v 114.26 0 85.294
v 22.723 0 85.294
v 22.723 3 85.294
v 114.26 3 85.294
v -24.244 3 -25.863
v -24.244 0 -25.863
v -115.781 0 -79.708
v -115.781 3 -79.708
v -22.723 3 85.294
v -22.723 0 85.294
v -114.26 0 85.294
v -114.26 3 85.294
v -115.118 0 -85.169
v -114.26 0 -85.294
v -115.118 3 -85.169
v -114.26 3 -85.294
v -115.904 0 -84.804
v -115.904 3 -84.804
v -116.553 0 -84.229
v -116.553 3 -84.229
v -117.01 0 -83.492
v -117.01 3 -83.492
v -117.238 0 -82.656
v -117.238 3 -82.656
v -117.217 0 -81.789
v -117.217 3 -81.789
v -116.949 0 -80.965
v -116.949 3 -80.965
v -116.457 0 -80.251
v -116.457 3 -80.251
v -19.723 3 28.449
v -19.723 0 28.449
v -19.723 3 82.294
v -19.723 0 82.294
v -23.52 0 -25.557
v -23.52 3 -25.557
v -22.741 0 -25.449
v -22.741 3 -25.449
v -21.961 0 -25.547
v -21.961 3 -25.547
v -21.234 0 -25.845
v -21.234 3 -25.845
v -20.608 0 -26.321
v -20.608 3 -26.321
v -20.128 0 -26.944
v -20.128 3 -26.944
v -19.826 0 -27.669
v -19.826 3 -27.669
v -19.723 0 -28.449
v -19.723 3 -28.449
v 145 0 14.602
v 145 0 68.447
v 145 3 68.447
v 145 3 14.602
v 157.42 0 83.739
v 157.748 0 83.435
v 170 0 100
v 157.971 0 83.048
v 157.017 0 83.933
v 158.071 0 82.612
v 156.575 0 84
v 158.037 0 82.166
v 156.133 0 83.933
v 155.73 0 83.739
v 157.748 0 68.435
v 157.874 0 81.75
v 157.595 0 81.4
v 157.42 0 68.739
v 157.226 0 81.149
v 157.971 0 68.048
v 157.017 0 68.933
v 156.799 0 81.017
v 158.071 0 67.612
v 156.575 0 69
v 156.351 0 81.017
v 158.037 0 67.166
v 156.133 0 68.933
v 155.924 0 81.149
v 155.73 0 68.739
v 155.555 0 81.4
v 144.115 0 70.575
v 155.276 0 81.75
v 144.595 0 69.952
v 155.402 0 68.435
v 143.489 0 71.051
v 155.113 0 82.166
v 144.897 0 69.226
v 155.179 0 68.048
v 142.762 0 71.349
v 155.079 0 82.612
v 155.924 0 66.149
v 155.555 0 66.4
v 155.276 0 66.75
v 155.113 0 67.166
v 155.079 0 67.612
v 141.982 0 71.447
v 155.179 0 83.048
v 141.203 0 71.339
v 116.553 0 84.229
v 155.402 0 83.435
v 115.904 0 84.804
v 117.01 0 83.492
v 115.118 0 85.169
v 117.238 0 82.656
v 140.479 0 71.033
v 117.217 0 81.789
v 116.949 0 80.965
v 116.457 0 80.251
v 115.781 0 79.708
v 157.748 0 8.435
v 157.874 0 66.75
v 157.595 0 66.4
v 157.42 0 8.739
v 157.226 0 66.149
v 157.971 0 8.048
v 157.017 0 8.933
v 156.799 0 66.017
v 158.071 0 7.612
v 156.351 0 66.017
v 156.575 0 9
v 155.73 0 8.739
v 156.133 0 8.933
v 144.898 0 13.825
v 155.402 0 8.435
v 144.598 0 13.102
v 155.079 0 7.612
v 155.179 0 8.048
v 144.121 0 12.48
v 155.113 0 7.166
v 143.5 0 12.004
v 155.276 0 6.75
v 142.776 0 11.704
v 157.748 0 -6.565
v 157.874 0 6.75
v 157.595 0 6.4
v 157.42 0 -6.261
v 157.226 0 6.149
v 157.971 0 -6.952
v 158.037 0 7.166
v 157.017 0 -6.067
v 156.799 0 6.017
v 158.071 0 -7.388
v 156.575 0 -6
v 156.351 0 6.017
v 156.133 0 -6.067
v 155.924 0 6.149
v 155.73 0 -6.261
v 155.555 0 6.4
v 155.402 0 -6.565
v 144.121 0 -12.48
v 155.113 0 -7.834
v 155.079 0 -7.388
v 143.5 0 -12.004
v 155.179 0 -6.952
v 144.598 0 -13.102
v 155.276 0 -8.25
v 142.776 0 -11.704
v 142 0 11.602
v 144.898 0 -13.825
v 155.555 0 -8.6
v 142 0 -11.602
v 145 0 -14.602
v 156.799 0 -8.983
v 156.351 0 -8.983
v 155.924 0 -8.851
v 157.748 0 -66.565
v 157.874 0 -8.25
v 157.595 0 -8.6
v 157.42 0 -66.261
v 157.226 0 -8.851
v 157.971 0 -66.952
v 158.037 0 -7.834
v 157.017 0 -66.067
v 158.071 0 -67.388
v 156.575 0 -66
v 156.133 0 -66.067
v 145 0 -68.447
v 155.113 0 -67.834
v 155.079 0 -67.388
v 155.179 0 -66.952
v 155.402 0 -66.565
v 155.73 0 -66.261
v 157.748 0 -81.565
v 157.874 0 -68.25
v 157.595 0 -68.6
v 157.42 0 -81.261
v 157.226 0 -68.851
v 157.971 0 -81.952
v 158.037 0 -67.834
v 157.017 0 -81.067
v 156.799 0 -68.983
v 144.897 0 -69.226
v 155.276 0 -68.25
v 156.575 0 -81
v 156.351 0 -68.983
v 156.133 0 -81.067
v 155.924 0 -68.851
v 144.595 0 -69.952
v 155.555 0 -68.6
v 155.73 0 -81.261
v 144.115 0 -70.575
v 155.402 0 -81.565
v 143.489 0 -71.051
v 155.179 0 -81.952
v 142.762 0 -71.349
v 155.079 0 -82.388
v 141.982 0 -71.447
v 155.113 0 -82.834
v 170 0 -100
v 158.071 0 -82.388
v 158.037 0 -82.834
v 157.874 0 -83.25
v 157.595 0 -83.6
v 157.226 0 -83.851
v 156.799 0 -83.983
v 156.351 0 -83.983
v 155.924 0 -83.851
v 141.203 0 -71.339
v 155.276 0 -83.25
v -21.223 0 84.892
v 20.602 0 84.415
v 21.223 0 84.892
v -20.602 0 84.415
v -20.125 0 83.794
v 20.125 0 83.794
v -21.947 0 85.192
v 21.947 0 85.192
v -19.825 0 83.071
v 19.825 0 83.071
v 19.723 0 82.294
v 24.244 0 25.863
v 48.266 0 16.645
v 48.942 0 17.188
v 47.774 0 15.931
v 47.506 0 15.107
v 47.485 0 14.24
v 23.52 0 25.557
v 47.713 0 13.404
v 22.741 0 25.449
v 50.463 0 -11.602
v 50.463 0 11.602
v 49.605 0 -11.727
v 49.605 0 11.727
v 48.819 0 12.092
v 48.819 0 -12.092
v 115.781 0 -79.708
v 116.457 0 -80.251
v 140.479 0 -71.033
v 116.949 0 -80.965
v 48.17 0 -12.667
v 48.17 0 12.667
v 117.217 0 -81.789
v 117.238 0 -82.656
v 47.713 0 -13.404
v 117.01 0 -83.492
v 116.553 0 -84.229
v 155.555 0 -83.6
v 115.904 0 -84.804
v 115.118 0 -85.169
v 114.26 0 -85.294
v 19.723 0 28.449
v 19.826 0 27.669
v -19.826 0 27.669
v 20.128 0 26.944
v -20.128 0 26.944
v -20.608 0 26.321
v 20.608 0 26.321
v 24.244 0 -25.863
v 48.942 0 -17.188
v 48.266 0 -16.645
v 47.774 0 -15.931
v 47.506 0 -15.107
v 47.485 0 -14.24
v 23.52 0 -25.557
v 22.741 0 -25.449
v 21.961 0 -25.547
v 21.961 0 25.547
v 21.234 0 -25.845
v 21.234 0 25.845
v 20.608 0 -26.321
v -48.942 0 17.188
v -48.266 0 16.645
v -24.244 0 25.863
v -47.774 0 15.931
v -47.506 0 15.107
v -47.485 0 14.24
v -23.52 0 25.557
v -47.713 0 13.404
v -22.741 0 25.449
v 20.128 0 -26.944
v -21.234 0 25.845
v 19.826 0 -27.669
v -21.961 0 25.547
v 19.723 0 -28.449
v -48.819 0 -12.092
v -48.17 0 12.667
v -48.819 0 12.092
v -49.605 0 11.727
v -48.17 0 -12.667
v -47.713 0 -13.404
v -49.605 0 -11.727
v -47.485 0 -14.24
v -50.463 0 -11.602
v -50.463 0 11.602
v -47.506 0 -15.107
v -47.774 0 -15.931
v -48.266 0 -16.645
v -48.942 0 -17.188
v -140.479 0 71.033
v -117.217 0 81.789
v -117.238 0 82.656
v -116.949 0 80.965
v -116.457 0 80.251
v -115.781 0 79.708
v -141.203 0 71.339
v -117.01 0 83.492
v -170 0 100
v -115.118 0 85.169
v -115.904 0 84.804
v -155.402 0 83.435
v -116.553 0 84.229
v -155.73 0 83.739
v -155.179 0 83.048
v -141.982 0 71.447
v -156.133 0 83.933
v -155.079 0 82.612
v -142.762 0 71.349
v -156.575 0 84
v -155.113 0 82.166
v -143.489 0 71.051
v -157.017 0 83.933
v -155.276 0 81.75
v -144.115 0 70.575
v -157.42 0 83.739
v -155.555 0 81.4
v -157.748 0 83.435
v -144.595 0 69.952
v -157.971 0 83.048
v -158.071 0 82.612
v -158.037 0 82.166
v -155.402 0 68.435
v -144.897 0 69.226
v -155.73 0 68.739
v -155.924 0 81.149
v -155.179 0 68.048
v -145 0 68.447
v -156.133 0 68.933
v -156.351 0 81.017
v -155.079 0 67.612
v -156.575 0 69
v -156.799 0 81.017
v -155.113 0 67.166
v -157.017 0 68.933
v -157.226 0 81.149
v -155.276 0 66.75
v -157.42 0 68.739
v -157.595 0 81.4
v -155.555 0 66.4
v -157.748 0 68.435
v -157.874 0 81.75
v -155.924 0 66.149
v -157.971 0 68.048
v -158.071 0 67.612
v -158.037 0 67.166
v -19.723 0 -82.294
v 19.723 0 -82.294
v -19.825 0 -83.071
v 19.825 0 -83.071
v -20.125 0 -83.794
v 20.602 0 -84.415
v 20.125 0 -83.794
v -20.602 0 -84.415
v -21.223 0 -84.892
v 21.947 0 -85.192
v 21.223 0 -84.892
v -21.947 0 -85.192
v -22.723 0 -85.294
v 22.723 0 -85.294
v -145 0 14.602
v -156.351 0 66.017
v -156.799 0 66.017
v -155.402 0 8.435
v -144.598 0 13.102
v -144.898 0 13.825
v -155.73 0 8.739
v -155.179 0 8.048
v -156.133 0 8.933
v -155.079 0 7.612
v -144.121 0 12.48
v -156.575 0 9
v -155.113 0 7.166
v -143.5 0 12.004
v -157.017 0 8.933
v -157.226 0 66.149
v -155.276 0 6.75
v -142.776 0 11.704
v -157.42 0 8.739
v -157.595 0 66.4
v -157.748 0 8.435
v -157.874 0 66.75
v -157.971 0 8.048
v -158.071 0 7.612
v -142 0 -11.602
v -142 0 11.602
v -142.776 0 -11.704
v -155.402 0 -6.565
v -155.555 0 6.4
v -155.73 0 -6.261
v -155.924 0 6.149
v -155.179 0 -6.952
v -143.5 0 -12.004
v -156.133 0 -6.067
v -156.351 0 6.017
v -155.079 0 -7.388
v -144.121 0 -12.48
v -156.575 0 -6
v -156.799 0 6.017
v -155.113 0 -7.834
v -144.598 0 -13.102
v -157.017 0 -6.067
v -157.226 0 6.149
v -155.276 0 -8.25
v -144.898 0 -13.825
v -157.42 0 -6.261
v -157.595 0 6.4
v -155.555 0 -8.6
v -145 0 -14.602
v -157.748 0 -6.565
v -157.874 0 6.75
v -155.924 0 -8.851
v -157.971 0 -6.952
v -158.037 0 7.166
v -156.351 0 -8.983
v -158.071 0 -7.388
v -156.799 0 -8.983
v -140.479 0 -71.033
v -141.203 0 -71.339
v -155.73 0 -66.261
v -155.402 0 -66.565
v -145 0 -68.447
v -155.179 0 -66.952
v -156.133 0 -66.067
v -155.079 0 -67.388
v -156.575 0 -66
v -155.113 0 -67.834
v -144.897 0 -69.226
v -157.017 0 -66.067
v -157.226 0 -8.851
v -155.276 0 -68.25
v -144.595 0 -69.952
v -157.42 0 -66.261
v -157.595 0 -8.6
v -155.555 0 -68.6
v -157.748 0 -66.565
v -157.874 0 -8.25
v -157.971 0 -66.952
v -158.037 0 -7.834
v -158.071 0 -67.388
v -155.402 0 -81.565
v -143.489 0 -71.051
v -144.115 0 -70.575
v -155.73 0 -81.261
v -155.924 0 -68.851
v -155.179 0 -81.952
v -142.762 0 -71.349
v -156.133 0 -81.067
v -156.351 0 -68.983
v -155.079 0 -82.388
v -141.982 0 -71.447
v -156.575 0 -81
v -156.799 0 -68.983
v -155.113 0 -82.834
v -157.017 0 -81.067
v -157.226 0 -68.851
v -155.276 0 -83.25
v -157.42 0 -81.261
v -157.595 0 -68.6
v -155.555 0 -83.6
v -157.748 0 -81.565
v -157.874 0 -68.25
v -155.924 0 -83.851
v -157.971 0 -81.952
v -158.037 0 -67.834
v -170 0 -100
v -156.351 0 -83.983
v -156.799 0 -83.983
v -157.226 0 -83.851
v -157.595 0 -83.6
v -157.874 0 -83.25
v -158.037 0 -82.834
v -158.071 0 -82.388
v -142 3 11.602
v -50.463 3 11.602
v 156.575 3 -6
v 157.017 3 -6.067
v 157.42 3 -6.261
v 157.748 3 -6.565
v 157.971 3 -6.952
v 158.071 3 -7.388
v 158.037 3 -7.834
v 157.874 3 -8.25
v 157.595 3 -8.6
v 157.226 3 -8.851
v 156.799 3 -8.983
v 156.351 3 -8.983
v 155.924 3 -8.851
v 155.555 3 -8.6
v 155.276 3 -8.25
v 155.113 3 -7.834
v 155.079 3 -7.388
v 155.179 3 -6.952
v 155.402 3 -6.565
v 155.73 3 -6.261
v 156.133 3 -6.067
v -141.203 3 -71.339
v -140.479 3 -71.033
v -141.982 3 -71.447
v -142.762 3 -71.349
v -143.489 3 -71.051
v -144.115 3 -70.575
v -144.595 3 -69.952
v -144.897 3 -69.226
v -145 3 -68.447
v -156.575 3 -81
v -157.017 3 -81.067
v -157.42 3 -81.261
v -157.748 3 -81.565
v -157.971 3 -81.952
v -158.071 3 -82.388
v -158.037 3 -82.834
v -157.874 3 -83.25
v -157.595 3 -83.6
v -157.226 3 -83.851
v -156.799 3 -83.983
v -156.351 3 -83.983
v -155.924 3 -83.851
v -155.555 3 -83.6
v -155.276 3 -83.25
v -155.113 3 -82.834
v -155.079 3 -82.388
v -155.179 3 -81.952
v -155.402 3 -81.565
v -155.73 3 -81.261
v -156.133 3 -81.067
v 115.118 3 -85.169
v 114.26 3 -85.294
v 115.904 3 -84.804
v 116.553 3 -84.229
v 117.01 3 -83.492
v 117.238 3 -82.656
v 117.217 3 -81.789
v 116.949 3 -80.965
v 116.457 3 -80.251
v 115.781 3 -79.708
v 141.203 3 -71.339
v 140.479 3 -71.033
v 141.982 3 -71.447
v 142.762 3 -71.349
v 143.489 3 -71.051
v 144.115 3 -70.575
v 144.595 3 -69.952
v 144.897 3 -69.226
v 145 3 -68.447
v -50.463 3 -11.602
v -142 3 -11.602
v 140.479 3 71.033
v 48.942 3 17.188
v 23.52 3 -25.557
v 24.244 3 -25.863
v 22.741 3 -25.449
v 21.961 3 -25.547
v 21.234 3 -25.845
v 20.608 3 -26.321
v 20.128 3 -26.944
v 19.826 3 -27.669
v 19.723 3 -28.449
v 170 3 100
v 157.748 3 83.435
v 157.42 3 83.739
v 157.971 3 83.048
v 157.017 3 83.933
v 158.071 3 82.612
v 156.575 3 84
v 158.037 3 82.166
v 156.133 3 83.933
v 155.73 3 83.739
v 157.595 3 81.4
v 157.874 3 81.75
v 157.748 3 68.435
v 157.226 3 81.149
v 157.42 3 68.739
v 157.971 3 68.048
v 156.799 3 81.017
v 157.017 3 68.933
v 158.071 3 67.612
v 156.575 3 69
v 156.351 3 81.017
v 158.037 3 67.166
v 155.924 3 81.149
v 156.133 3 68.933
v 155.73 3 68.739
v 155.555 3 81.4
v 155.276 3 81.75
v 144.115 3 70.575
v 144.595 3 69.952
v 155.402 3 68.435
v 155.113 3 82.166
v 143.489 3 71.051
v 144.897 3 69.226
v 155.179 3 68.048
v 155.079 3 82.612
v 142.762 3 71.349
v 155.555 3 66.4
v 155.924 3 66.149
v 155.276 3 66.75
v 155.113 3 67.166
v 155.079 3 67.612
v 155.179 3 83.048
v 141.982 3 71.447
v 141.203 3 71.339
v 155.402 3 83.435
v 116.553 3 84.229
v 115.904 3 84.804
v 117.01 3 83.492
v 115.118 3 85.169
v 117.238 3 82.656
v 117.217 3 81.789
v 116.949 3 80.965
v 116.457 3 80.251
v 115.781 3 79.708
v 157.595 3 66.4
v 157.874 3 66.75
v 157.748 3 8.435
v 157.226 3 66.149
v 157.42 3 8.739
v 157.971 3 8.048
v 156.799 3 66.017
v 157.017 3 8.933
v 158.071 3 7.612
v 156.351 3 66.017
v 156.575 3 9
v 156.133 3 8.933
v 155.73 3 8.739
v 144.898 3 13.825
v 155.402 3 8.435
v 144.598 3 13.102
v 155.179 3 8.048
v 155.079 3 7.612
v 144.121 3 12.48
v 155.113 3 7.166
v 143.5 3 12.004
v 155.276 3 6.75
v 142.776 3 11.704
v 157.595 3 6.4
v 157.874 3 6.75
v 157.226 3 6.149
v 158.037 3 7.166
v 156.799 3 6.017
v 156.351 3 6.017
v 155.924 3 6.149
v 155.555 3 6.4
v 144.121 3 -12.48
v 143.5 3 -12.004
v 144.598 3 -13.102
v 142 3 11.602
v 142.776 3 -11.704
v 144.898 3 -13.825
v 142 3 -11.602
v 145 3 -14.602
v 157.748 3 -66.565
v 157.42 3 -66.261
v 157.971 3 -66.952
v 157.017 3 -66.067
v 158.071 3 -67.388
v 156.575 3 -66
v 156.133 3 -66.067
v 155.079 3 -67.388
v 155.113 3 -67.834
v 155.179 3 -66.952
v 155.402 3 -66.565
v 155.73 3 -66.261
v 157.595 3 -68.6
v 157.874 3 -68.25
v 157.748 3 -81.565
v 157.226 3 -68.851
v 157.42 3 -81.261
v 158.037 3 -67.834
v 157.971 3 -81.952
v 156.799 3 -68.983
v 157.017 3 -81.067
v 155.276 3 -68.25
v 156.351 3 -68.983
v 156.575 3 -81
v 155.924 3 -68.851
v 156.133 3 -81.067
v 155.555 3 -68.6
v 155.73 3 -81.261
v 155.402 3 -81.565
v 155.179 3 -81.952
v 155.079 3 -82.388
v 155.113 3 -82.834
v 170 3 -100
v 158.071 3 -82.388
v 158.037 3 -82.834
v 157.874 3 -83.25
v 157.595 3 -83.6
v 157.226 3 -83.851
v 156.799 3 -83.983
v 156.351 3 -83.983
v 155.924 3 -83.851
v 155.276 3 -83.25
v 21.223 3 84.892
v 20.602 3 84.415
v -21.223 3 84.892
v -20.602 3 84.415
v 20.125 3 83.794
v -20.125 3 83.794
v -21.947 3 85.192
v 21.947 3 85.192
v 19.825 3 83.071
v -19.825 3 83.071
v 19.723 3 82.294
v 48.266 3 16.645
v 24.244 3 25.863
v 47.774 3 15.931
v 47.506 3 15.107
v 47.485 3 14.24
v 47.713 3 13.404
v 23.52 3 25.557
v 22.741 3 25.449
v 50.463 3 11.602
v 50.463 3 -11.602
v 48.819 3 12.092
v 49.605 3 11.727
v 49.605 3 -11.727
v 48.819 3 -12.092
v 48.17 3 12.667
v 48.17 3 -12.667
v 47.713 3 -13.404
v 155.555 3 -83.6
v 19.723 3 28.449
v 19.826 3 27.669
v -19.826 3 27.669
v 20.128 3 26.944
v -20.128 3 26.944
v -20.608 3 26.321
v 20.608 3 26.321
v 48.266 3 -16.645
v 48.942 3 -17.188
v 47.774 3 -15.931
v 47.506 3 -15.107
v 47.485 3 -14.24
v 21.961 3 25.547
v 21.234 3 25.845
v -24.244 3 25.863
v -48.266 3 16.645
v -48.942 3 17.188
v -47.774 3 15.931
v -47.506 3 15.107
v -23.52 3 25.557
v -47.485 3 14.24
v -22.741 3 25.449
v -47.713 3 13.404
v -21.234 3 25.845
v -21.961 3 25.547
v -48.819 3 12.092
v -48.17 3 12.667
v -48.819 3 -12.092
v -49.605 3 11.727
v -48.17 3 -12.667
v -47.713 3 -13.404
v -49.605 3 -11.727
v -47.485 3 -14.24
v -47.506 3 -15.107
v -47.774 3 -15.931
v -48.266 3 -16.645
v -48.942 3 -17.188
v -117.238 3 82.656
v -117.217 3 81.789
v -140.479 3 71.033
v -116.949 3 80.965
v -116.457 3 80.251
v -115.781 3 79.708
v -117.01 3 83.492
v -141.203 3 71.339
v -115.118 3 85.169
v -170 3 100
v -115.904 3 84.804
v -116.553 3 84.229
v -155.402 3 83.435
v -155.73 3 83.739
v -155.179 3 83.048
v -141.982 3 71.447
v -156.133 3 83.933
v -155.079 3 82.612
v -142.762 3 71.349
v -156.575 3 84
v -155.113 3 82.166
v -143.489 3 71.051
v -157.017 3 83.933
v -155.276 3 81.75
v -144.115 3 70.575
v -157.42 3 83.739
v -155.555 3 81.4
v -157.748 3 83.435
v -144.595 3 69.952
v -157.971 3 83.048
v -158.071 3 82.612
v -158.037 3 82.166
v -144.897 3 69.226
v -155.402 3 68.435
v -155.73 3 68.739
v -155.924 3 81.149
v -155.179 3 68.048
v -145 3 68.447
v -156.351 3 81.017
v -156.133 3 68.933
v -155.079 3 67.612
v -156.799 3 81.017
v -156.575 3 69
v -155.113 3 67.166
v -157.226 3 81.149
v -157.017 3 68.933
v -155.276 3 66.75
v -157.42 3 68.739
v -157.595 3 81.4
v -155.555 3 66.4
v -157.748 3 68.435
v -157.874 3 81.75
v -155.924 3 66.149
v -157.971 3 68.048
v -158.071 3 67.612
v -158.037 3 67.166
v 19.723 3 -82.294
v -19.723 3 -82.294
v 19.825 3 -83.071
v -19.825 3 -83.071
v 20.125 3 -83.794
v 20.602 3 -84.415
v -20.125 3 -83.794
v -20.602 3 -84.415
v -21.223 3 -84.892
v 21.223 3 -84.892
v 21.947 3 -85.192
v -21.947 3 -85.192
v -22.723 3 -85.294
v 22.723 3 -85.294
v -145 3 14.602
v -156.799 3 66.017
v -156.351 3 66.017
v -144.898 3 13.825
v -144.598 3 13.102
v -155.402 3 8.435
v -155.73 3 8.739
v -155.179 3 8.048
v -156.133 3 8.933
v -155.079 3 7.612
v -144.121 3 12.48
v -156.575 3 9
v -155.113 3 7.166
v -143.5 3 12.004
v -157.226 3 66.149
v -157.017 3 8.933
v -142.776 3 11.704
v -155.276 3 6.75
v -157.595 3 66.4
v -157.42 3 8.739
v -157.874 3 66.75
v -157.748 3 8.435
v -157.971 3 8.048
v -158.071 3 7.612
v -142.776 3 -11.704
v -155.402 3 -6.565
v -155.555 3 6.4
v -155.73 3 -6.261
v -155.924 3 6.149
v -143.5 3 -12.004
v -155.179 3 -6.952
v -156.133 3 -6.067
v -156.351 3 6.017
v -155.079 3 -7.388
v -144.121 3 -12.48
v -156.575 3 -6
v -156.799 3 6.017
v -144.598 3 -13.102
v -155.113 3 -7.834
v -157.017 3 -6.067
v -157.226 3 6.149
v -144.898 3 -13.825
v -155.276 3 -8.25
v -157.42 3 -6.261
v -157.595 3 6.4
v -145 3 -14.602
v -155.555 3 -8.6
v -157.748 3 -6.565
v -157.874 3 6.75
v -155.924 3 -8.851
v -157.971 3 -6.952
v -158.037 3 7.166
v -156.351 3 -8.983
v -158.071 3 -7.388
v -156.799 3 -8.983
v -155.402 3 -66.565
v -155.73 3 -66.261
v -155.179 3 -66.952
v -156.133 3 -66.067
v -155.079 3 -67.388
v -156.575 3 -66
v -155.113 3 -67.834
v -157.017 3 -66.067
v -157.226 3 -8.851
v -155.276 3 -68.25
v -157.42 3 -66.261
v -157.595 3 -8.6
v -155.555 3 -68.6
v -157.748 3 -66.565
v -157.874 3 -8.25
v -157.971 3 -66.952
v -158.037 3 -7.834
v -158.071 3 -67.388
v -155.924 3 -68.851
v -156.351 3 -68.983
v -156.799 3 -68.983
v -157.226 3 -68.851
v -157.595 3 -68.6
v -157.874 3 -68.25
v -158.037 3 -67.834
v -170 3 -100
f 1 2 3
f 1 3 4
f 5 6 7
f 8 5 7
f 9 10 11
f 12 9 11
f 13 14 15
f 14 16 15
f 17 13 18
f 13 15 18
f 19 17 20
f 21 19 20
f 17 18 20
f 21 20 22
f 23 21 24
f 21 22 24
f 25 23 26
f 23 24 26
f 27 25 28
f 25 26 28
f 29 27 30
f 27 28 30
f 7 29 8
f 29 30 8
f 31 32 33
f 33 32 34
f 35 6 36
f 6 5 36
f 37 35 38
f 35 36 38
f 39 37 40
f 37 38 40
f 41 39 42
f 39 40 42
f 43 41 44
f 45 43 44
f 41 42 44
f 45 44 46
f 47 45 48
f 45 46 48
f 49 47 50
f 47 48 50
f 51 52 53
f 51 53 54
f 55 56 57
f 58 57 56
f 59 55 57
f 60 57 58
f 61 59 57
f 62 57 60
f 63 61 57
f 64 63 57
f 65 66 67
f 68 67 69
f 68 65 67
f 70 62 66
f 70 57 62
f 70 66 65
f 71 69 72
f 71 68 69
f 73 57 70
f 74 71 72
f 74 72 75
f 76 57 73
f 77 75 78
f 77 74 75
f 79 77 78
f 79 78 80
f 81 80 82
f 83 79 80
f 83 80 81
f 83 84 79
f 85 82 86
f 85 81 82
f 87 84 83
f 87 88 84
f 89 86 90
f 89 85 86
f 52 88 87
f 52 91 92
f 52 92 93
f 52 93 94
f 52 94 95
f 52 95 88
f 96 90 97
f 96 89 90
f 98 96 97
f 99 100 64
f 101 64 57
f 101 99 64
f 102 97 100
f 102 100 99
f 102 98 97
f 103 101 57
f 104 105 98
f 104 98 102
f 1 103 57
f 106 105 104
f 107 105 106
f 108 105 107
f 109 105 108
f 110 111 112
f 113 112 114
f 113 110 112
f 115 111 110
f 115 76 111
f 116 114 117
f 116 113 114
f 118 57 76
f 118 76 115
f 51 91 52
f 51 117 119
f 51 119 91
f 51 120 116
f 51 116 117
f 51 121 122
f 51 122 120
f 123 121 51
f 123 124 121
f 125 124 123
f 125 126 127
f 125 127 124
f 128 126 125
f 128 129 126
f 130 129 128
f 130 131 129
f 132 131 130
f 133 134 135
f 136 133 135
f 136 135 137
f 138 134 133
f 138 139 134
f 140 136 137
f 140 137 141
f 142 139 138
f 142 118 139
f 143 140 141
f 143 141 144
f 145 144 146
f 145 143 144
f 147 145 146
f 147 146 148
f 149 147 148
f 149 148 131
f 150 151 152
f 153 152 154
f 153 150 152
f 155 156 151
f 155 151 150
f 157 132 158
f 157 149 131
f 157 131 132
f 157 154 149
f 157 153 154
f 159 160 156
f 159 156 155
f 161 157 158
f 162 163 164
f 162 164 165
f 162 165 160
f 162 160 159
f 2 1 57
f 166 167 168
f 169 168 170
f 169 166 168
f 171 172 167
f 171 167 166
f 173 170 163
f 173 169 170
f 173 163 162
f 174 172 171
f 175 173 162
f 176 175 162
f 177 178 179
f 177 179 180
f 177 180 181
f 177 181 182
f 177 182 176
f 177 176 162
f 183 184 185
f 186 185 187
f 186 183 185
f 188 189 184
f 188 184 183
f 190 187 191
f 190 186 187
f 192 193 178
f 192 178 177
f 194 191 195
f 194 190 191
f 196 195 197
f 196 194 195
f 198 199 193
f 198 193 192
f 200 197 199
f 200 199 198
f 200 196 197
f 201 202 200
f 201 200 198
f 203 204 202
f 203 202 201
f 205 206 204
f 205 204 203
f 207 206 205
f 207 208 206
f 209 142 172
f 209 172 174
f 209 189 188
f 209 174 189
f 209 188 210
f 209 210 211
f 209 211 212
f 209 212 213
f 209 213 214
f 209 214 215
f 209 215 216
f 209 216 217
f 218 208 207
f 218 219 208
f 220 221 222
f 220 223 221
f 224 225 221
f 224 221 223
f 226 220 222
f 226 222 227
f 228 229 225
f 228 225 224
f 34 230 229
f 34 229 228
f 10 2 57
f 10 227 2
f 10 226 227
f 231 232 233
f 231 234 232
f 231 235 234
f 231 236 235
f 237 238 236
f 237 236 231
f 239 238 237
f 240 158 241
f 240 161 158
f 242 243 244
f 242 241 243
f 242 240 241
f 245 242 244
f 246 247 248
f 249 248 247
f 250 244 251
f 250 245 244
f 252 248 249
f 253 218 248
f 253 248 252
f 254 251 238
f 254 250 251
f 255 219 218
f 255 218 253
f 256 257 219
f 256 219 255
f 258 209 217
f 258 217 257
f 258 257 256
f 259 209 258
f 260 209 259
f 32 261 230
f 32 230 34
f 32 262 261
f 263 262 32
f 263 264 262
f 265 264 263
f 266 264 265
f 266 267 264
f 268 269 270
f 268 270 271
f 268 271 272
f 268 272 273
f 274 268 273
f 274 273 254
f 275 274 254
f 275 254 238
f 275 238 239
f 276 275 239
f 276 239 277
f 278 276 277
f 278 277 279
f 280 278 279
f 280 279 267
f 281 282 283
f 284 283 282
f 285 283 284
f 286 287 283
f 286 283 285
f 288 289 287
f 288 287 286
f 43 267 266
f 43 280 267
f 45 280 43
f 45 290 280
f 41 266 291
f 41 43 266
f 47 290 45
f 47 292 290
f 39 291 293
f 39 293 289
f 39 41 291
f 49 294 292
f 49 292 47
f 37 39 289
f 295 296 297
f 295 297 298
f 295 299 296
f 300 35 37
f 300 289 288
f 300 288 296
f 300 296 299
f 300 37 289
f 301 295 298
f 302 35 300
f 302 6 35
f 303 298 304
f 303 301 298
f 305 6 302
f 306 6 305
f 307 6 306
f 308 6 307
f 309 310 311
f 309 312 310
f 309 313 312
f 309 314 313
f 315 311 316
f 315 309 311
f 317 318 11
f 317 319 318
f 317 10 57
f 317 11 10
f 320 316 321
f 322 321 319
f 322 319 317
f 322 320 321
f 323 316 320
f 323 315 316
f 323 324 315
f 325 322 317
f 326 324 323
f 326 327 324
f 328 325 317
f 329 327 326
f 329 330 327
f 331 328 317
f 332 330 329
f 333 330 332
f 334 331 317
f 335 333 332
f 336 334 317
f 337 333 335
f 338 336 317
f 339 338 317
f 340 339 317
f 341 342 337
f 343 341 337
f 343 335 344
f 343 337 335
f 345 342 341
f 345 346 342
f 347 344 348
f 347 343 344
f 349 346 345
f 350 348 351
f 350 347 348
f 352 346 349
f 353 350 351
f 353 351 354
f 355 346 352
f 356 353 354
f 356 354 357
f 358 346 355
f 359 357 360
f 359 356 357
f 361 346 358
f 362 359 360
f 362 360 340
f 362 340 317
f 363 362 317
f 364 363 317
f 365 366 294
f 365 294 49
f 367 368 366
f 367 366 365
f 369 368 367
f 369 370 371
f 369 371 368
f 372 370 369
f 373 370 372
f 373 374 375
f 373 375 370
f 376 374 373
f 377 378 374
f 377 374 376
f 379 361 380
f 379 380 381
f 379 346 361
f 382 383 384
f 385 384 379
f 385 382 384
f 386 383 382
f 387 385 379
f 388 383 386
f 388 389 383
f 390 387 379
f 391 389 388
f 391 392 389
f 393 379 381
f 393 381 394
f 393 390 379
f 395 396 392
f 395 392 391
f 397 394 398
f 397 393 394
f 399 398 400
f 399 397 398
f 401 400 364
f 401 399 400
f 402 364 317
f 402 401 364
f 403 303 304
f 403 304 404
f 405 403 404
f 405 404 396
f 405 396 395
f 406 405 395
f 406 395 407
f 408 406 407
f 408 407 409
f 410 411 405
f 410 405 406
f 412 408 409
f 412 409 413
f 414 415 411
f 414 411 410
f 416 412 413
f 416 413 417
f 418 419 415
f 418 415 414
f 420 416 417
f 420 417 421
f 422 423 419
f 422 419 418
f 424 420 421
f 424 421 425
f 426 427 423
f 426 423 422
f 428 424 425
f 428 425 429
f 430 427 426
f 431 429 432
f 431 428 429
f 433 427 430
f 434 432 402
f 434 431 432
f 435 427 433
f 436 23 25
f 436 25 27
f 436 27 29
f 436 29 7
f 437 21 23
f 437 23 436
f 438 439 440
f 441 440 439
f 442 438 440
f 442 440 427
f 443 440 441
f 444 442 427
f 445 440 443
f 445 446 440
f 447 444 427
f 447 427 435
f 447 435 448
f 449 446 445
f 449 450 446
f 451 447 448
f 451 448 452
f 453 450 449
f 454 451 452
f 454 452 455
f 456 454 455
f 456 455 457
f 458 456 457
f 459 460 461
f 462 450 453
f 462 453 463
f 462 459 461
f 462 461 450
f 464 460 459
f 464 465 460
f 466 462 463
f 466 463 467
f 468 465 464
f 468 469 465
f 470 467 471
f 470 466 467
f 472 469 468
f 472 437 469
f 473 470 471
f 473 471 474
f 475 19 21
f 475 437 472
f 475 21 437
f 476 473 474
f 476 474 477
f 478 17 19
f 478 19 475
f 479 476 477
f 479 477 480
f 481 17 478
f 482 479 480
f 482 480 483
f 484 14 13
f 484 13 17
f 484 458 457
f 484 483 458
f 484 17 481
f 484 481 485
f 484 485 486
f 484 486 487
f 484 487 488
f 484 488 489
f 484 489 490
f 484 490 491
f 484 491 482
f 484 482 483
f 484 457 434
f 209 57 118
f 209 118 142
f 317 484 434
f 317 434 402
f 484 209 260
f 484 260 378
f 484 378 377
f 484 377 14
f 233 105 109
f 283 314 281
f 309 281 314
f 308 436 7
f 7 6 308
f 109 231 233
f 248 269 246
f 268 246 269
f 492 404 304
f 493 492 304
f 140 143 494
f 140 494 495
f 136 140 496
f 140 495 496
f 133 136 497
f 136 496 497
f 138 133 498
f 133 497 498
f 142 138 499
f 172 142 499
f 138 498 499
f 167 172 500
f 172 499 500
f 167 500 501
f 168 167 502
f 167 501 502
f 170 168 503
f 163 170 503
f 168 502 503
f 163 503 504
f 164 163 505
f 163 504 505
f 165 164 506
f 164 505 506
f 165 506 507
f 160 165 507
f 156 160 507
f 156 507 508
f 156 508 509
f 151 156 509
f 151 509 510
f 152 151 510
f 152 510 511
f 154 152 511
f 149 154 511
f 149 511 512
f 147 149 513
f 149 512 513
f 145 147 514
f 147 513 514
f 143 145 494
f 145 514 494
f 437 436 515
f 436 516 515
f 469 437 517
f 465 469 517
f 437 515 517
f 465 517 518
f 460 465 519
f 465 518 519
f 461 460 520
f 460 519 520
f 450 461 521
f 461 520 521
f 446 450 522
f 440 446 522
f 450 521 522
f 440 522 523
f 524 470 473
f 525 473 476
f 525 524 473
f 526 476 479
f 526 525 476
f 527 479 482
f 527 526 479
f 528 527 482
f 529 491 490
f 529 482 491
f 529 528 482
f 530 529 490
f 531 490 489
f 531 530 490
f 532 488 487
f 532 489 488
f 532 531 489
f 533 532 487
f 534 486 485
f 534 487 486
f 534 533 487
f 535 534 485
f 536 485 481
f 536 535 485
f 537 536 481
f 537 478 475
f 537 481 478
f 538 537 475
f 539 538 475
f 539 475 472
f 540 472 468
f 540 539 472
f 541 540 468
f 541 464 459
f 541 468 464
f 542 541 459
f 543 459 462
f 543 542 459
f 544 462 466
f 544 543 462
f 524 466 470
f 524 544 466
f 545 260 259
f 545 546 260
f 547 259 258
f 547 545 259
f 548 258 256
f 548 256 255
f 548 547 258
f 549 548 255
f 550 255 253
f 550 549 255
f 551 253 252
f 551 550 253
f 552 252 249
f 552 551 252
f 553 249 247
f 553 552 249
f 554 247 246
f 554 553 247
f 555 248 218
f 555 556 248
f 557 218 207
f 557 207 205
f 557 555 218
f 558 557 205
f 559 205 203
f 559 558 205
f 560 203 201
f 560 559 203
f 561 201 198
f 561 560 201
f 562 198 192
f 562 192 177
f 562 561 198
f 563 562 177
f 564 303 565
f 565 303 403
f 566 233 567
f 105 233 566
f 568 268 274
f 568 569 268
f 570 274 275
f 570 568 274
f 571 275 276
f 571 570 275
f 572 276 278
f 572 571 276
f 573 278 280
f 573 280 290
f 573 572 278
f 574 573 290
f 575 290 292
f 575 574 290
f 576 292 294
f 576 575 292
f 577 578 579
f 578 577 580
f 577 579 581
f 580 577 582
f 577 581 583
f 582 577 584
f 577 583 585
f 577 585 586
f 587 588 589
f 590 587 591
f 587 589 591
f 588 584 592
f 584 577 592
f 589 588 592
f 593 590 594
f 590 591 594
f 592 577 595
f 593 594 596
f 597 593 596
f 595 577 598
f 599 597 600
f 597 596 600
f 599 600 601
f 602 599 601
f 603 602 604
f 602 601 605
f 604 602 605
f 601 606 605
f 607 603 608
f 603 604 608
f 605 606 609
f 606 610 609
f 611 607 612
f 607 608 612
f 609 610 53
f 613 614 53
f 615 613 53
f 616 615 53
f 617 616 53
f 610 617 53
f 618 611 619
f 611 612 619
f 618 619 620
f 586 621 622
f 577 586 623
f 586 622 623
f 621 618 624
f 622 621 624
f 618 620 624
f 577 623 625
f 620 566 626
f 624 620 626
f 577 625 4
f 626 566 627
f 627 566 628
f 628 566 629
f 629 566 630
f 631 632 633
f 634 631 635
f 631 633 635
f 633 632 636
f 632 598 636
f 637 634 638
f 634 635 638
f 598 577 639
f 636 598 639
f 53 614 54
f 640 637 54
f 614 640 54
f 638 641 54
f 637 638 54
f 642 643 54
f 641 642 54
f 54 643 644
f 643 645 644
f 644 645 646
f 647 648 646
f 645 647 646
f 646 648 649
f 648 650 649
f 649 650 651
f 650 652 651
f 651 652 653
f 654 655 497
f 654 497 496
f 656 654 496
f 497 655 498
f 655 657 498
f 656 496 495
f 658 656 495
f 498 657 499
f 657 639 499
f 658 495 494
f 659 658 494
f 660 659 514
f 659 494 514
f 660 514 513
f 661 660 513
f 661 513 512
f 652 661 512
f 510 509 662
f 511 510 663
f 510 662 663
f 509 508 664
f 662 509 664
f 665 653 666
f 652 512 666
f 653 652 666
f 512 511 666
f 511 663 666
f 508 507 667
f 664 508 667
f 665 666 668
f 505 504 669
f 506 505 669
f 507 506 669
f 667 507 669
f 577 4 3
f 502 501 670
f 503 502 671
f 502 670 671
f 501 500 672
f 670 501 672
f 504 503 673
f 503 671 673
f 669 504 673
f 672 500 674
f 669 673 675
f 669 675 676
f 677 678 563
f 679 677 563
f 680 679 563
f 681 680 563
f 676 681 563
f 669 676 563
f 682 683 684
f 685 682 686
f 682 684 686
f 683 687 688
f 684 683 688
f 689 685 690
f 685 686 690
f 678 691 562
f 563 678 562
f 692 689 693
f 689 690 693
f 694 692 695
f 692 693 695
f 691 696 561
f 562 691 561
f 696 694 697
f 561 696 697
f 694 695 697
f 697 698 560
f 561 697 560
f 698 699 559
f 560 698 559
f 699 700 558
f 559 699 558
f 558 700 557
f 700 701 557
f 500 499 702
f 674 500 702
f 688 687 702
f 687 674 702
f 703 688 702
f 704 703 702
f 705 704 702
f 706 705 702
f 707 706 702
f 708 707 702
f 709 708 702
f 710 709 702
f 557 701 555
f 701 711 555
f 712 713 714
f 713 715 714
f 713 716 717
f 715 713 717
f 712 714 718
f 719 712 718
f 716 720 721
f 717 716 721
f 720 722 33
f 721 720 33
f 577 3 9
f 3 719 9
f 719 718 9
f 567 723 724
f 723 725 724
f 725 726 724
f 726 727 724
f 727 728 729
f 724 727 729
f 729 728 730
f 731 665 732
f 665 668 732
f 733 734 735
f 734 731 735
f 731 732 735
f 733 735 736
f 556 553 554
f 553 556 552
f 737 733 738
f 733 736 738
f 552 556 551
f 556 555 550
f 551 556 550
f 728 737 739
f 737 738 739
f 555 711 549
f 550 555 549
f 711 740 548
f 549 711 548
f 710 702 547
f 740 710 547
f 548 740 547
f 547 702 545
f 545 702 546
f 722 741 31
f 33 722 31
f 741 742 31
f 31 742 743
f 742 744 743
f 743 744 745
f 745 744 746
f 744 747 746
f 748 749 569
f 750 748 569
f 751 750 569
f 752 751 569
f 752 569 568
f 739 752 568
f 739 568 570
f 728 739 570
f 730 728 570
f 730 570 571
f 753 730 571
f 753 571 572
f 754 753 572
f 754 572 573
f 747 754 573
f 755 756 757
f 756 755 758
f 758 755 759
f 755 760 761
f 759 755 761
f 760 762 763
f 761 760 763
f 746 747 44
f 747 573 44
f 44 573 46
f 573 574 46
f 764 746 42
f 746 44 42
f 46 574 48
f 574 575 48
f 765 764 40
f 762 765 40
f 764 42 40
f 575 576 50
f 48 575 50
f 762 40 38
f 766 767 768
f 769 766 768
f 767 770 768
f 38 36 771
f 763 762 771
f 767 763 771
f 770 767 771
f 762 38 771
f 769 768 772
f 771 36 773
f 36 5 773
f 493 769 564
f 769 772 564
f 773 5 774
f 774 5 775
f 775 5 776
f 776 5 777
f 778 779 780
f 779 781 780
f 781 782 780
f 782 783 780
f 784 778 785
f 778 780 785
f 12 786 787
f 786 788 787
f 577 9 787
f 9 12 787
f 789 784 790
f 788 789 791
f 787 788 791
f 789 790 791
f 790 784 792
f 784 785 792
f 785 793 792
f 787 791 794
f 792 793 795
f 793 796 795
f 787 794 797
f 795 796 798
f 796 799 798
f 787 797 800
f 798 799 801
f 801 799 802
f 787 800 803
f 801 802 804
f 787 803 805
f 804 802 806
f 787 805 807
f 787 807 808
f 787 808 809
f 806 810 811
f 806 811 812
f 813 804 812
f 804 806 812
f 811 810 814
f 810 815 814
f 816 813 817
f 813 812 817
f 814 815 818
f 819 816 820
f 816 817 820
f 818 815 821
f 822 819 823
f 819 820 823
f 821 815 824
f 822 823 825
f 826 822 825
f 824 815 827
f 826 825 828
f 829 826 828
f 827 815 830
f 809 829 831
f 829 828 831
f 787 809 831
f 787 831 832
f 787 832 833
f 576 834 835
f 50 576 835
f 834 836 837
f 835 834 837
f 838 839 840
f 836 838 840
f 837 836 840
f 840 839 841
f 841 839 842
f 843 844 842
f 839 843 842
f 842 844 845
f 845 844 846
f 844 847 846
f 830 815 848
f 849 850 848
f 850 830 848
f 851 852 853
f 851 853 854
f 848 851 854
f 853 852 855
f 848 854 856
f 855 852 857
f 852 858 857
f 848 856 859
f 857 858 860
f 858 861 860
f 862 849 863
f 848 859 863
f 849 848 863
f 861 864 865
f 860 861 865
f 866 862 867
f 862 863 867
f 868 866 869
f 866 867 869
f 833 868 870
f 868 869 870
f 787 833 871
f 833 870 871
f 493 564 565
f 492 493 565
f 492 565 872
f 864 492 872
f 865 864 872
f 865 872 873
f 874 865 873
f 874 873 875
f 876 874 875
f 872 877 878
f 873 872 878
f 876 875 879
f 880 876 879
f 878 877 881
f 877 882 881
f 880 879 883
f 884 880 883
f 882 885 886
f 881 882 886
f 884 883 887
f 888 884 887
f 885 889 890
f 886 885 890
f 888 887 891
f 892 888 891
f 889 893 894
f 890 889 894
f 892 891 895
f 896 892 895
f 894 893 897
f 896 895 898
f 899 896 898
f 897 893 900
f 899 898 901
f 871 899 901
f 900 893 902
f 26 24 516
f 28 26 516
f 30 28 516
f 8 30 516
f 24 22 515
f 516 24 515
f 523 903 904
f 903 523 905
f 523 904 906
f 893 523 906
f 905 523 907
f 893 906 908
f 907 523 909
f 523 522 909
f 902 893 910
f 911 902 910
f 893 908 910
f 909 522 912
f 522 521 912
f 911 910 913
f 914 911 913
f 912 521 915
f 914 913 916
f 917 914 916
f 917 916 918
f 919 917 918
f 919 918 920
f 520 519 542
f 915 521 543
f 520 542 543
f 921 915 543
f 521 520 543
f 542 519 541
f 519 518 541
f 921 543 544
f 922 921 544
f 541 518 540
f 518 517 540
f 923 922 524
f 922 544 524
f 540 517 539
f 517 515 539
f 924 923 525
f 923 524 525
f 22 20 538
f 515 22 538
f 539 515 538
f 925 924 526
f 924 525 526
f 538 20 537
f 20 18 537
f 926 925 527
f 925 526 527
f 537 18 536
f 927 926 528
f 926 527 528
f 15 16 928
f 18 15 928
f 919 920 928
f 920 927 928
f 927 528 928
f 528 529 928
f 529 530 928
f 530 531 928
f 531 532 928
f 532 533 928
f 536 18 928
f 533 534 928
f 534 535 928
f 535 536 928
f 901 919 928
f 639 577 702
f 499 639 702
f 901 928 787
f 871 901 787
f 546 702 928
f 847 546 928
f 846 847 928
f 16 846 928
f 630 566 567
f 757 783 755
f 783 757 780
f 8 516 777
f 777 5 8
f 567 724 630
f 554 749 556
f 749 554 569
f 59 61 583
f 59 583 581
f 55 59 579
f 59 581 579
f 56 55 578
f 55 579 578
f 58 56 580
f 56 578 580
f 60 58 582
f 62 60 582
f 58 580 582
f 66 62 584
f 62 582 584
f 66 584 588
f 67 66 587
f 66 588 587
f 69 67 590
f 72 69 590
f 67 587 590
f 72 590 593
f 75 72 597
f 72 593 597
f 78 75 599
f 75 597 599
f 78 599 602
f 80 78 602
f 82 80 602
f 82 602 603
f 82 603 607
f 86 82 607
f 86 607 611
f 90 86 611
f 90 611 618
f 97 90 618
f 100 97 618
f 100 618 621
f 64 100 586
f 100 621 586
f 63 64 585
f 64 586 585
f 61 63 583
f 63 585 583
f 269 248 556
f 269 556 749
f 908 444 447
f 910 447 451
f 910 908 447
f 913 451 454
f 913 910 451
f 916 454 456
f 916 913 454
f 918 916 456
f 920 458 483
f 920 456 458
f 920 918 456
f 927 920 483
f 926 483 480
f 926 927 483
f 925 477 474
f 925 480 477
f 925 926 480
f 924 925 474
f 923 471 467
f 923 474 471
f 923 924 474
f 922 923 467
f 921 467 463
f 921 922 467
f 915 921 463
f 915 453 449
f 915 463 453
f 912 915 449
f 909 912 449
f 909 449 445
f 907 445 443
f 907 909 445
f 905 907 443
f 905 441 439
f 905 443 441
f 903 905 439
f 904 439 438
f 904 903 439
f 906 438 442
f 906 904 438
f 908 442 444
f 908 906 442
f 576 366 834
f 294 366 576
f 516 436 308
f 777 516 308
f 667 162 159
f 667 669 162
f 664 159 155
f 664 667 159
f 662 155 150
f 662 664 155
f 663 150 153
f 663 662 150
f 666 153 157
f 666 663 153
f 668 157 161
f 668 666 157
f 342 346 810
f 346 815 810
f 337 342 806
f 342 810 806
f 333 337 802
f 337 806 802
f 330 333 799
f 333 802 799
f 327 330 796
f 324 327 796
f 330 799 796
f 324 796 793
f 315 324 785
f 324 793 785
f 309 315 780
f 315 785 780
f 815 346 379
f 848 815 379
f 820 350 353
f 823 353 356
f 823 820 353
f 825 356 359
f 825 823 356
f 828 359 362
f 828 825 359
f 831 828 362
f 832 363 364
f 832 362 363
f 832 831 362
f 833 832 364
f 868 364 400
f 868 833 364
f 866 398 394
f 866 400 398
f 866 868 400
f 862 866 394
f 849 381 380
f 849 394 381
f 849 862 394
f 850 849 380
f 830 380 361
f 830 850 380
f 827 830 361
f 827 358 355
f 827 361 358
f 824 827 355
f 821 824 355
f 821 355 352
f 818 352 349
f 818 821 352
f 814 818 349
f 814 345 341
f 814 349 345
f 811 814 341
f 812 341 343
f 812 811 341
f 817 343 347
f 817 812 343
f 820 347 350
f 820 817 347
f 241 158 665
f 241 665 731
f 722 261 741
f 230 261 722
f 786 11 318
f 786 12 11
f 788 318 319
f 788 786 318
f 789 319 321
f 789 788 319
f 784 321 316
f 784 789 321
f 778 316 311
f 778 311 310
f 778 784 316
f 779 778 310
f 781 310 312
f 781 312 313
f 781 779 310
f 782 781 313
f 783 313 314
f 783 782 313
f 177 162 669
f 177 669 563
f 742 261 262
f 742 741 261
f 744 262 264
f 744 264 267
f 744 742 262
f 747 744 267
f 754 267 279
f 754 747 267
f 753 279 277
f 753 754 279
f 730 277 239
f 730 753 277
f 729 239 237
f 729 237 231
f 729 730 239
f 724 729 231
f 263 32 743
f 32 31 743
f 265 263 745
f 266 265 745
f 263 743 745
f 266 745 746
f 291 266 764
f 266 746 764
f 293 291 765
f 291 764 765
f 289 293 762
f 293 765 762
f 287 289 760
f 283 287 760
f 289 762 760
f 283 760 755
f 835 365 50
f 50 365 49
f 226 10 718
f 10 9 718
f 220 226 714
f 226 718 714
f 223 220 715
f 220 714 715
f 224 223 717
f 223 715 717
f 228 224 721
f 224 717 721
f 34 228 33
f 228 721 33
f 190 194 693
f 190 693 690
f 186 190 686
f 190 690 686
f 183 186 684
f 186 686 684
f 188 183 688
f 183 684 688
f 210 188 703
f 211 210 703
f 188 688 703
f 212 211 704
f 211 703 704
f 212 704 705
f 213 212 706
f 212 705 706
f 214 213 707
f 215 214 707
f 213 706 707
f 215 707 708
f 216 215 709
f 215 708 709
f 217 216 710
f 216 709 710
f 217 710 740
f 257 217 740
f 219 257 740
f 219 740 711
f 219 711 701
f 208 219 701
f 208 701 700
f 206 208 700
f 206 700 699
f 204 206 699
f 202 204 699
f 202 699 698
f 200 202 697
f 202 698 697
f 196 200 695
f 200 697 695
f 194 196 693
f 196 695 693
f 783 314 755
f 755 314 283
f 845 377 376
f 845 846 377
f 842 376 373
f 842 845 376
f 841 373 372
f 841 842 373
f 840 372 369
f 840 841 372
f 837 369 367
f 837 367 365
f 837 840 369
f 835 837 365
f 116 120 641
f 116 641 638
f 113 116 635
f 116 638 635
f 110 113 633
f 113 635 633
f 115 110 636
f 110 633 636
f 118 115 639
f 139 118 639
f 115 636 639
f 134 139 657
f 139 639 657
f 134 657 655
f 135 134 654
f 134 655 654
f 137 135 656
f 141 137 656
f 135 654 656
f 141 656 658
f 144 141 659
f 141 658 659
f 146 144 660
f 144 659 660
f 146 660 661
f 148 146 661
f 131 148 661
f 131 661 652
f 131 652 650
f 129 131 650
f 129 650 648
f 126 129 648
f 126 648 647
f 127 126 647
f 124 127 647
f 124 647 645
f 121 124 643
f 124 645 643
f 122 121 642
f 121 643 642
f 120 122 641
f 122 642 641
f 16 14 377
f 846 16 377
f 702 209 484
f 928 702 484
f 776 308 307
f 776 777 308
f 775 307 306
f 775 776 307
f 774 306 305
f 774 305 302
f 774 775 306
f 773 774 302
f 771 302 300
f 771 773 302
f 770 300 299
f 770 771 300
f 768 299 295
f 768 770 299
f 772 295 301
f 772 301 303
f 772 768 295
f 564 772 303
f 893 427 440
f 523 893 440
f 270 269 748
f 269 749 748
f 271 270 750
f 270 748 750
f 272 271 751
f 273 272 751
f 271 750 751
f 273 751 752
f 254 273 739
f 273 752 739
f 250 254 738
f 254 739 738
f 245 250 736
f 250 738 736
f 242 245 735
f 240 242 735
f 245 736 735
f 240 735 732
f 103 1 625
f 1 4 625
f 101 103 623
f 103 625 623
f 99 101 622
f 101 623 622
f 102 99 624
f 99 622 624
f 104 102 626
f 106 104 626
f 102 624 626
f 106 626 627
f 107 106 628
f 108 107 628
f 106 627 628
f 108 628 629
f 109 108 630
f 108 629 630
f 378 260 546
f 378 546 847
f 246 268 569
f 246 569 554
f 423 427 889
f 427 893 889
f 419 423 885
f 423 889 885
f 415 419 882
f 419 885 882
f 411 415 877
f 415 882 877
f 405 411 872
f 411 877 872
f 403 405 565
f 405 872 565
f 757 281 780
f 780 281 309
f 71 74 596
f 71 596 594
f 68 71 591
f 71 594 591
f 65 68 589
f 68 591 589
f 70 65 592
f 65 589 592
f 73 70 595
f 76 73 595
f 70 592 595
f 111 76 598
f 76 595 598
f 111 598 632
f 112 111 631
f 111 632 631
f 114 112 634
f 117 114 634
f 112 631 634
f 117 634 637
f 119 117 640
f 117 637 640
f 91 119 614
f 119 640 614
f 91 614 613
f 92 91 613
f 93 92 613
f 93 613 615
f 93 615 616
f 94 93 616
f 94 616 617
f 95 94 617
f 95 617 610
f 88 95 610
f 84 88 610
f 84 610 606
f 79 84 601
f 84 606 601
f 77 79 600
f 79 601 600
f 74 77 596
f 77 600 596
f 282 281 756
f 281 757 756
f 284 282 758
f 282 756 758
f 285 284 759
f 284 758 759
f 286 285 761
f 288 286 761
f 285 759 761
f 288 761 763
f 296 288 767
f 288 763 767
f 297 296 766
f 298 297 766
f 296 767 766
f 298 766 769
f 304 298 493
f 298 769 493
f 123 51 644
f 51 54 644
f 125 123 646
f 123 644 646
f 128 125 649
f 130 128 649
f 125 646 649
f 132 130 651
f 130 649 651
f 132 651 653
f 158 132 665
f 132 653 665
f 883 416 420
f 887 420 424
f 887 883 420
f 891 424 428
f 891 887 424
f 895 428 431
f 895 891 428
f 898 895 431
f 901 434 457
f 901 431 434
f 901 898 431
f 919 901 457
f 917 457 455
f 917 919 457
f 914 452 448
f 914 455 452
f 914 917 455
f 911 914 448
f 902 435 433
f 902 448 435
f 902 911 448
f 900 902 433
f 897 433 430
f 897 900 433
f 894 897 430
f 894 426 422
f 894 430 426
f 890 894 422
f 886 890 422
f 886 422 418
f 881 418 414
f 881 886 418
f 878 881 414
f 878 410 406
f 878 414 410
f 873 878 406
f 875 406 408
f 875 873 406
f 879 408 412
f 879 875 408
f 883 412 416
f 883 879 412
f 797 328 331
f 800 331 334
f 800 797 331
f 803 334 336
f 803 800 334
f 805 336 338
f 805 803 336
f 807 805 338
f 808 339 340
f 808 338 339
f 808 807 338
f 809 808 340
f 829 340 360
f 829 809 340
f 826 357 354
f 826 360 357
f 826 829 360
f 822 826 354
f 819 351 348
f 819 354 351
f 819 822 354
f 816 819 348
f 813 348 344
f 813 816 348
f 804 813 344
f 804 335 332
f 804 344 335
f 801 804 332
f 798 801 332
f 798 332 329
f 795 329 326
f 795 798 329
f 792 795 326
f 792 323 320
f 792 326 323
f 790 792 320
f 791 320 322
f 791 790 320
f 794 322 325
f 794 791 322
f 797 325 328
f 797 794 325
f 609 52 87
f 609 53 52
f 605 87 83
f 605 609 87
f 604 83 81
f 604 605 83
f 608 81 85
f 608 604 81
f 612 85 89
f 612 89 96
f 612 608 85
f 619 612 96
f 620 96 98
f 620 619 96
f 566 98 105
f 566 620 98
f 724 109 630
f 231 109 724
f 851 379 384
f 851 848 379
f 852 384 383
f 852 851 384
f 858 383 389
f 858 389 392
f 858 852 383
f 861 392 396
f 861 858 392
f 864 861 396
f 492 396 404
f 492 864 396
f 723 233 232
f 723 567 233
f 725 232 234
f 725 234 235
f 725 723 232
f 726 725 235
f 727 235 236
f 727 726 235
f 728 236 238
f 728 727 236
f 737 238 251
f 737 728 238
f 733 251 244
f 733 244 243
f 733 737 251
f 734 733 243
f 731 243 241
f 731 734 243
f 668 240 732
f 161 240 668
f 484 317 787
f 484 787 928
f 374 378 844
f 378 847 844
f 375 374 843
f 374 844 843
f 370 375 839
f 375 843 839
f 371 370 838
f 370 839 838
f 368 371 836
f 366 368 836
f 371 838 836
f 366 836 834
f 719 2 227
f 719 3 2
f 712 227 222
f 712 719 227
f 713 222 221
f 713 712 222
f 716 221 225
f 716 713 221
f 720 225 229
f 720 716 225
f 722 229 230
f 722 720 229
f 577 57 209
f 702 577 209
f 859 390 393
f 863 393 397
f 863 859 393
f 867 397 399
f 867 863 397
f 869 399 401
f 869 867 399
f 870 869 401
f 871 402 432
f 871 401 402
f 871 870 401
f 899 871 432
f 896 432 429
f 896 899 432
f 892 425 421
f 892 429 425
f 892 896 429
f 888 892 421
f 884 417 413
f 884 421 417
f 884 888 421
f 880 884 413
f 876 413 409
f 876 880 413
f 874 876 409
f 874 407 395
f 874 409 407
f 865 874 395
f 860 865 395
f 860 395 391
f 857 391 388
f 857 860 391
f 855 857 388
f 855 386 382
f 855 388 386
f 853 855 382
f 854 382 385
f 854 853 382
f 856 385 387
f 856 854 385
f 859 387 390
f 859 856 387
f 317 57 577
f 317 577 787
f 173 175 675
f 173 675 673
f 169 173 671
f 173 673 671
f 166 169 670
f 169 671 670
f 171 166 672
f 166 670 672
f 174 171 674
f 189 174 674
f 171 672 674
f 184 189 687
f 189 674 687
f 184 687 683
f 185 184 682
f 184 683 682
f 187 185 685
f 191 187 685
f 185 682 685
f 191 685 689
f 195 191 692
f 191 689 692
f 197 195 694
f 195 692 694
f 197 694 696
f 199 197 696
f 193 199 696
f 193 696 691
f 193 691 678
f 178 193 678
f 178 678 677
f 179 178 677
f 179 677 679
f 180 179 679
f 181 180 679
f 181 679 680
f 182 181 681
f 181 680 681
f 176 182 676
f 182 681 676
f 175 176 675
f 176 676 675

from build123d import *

# Parameters (mm, degrees)
SKETCH1_W                      = 170
SKETCH1_H                      = 200
BOSS_EXTRUDE1_DEPTH            = 3
FILLET1_R                      = 3
F_3_0MM_DOWEL_HOLE1_AT_2_COUNT = 2
F_3_0MM_DOWEL_HOLE1_AT_2_PITCH = 15
F_3_0MM_DOWEL_HOLE1_AT_3_COUNT = 2
F_3_0MM_DOWEL_HOLE1_AT_3_PITCH = 75
F_3_0MM_DOWEL_HOLE1_AT_4_COUNT = 2
F_3_0MM_DOWEL_HOLE1_AT_4_PITCH = 90
F_3_0MM_DOWEL_HOLE1_AT_5_COUNT = 2
F_3_0MM_DOWEL_HOLE1_AT_5_PITCH = 60
F_3_0MM_DOWEL_HOLE1_AT_6_COUNT = 2
F_3_0MM_DOWEL_HOLE1_AT_6_PITCH = 75
FILLET1_OF_MIRROR1_R           = 3


with BuildPart() as part:
    # Sketch1 → Boss-Extrude1 (new body)
    with BuildSketch(Plane(origin=(0, 0, 0), x_dir=(1, 0, 0), z_dir=(0, 1, 0))):
        with Locations((-85, 0)):
            Rectangle(SKETCH1_W, SKETCH1_H)
        Polygon((-19.723082923, 85.294117647), (-19.723082923, 23.203626969), (-125.276917077, 85.294117647), align=None, mode=Mode.SUBTRACT)
        Polygon((-39.446165847, 11.601813484), (-145, 11.601813484), (-145, 73.692304163), align=None, mode=Mode.SUBTRACT)
        Polygon((-125.276917077, -85.294117647), (-19.723082923, -23.203626969), (-19.723082923, -85.294117647), align=None, mode=Mode.SUBTRACT)
        Polygon((-145, -11.601813484), (-39.446165847, -11.601813484), (-145, -73.692304163), align=None, mode=Mode.SUBTRACT)
    boss_extrude1 = extrude(amount=BOSS_EXTRUDE1_DEPTH)

    # Fillet1
    fillet1_edges = [part.edges().sort_by_distance(p)[0] for p in [
        (-19.723082923, 1.5, -23.203626969),
        (-19.723082923, 1.5, -85.294117647),
        (-125.276917077, 1.5, -85.294117647),
        (-39.446165847, 1.5, -11.601813484),
        (-145, 1.5, -73.692304163),
        (-145, 1.5, -11.601813484),
        (-39.446165847, 1.5, 11.601813484),
        (-145, 1.5, 11.601813484),
        (-145, 1.5, 73.692304163),
        (-19.723082923, 1.5, 23.203626969),
        (-125.276917077, 1.5, 85.294117647),
        (-19.723082923, 1.5, 85.294117647),
    ]]
    fillet(fillet1_edges, radius=FILLET1_R)

    # Sketch2 → Ø3.0mm Dowel Hole1 (revolve, cut)
    with BuildSketch(Plane(origin=(-156.575, 3, -7.5), x_dir=(0, 0, 1), z_dir=(1, 0, 0))):
        Polygon((0, 0), (0, 15.901290929), (1.5, 15), (1.5, 0), align=None)
    f_3_0mm_dowel_hole1 = revolve(axis=Axis((-156.575, 9.35, -7.5), (0, -1, 0)), mode=Mode.SUBTRACT)

    # Ø3.0mm Dowel Hole1 at 2: Ø3.0mm Dowel Hole1 ×2
    with Locations(*[(0, 0, i * F_3_0MM_DOWEL_HOLE1_AT_2_PITCH) for i in range(1, F_3_0MM_DOWEL_HOLE1_AT_2_COUNT)]):
        add(f_3_0mm_dowel_hole1, mode=Mode.SUBTRACT)

    # Ø3.0mm Dowel Hole1 at 3: Ø3.0mm Dowel Hole1 ×2
    with Locations(*[(0, 0, i * F_3_0MM_DOWEL_HOLE1_AT_3_PITCH) for i in range(1, F_3_0MM_DOWEL_HOLE1_AT_3_COUNT)]):
        add(f_3_0mm_dowel_hole1, mode=Mode.SUBTRACT)

    # Ø3.0mm Dowel Hole1 at 4: Ø3.0mm Dowel Hole1 ×2
    with Locations(*[(0, 0, i * F_3_0MM_DOWEL_HOLE1_AT_4_PITCH) for i in range(1, F_3_0MM_DOWEL_HOLE1_AT_4_COUNT)]):
        add(f_3_0mm_dowel_hole1, mode=Mode.SUBTRACT)

    # Ø3.0mm Dowel Hole1 at 5: Ø3.0mm Dowel Hole1 ×2
    with Locations(*[(0, 0, -i * F_3_0MM_DOWEL_HOLE1_AT_5_PITCH) for i in range(1, F_3_0MM_DOWEL_HOLE1_AT_5_COUNT)]):
        add(f_3_0mm_dowel_hole1, mode=Mode.SUBTRACT)

    # Ø3.0mm Dowel Hole1 at 6: Ø3.0mm Dowel Hole1 ×2
    with Locations(*[(0, 0, -i * F_3_0MM_DOWEL_HOLE1_AT_6_PITCH) for i in range(1, F_3_0MM_DOWEL_HOLE1_AT_6_COUNT)]):
        add(f_3_0mm_dowel_hole1, mode=Mode.SUBTRACT)

    # Mirror1: Boss-Extrude1, Ø3.0mm Dowel Hole1 across plane
    add(boss_extrude1.mirror(Plane(origin=(0, 0, 0), x_dir=(0, 0, 1), z_dir=(1, 0, 0))))
    add(f_3_0mm_dowel_hole1.mirror(Plane(origin=(0, 0, 0), x_dir=(0, 0, 1), z_dir=(1, 0, 0))), mode=Mode.SUBTRACT)

    # Mirror1 copy 1 sketch → Mirror1 copy 1 (revolve, cut)
    with BuildSketch(Plane(origin=(156.575, 3, 7.5), x_dir=(0, 0, 1), z_dir=(-1, 0, 0))):
        Polygon((0, 0), (0, -15.901290929), (1.5, -15), (1.5, 0), align=None)
    revolve(axis=Axis((156.575, 9.35, 7.5), (0, 1, 0)), mode=Mode.SUBTRACT)

    # Mirror1 copy 2 sketch → Mirror1 copy 2 (revolve, cut)
    with BuildSketch(Plane(origin=(156.575, 3, 67.5), x_dir=(0, 0, 1), z_dir=(-1, 0, 0))):
        Polygon((0, 0), (0, -15.901290929), (1.5, -15), (1.5, 0), align=None)
    revolve(axis=Axis((156.575, 9.35, 67.5), (0, 1, 0)), mode=Mode.SUBTRACT)

    # Mirror1 copy 3 sketch → Mirror1 copy 3 (revolve, cut)
    with BuildSketch(Plane(origin=(156.575, 3, 82.5), x_dir=(0, 0, 1), z_dir=(-1, 0, 0))):
        Polygon((0, 0), (0, -15.901290929), (1.5, -15), (1.5, 0), align=None)
    revolve(axis=Axis((156.575, 9.35, 82.5), (0, 1, 0)), mode=Mode.SUBTRACT)

    # Mirror1 copy 4 sketch → Mirror1 copy 4 (revolve, cut)
    with BuildSketch(Plane(origin=(156.575, 3, -67.5), x_dir=(0, 0, 1), z_dir=(-1, 0, 0))):
        Polygon((0, 0), (0, -15.901290929), (1.5, -15), (1.5, 0), align=None)
    revolve(axis=Axis((156.575, 9.35, -67.5), (0, 1, 0)), mode=Mode.SUBTRACT)

    # Mirror1 copy 5 sketch → Mirror1 copy 5 (revolve, cut)
    with BuildSketch(Plane(origin=(156.575, 3, -82.5), x_dir=(0, 0, 1), z_dir=(-1, 0, 0))):
        Polygon((0, 0), (0, -15.901290929), (1.5, -15), (1.5, 0), align=None)
    revolve(axis=Axis((156.575, 9.35, -82.5), (0, 1, 0)), mode=Mode.SUBTRACT)

    # Fillet1 of Mirror1
    fillet1_of_mirror1_edges = [part.edges().sort_by_distance(p)[0] for p in [
        (19.723082923, 1.5, -23.203626969),
        (19.723082923, 1.5, -85.294117647),
        (125.276917077, 1.5, -85.294117647),
        (39.446165847, 1.5, -11.601813484),
        (145, 1.5, -73.692304163),
        (145, 1.5, -11.601813484),
        (39.446165847, 1.5, 11.601813484),
        (145, 1.5, 11.601813484),
        (145, 1.5, 73.692304163),
        (19.723082923, 1.5, 23.203626969),
        (125.276917077, 1.5, 85.294117647),
        (19.723082923, 1.5, 85.294117647),
    ]]
    fillet(fillet1_of_mirror1_edges, radius=FILLET1_OF_MIRROR1_R)


solid = part.part
